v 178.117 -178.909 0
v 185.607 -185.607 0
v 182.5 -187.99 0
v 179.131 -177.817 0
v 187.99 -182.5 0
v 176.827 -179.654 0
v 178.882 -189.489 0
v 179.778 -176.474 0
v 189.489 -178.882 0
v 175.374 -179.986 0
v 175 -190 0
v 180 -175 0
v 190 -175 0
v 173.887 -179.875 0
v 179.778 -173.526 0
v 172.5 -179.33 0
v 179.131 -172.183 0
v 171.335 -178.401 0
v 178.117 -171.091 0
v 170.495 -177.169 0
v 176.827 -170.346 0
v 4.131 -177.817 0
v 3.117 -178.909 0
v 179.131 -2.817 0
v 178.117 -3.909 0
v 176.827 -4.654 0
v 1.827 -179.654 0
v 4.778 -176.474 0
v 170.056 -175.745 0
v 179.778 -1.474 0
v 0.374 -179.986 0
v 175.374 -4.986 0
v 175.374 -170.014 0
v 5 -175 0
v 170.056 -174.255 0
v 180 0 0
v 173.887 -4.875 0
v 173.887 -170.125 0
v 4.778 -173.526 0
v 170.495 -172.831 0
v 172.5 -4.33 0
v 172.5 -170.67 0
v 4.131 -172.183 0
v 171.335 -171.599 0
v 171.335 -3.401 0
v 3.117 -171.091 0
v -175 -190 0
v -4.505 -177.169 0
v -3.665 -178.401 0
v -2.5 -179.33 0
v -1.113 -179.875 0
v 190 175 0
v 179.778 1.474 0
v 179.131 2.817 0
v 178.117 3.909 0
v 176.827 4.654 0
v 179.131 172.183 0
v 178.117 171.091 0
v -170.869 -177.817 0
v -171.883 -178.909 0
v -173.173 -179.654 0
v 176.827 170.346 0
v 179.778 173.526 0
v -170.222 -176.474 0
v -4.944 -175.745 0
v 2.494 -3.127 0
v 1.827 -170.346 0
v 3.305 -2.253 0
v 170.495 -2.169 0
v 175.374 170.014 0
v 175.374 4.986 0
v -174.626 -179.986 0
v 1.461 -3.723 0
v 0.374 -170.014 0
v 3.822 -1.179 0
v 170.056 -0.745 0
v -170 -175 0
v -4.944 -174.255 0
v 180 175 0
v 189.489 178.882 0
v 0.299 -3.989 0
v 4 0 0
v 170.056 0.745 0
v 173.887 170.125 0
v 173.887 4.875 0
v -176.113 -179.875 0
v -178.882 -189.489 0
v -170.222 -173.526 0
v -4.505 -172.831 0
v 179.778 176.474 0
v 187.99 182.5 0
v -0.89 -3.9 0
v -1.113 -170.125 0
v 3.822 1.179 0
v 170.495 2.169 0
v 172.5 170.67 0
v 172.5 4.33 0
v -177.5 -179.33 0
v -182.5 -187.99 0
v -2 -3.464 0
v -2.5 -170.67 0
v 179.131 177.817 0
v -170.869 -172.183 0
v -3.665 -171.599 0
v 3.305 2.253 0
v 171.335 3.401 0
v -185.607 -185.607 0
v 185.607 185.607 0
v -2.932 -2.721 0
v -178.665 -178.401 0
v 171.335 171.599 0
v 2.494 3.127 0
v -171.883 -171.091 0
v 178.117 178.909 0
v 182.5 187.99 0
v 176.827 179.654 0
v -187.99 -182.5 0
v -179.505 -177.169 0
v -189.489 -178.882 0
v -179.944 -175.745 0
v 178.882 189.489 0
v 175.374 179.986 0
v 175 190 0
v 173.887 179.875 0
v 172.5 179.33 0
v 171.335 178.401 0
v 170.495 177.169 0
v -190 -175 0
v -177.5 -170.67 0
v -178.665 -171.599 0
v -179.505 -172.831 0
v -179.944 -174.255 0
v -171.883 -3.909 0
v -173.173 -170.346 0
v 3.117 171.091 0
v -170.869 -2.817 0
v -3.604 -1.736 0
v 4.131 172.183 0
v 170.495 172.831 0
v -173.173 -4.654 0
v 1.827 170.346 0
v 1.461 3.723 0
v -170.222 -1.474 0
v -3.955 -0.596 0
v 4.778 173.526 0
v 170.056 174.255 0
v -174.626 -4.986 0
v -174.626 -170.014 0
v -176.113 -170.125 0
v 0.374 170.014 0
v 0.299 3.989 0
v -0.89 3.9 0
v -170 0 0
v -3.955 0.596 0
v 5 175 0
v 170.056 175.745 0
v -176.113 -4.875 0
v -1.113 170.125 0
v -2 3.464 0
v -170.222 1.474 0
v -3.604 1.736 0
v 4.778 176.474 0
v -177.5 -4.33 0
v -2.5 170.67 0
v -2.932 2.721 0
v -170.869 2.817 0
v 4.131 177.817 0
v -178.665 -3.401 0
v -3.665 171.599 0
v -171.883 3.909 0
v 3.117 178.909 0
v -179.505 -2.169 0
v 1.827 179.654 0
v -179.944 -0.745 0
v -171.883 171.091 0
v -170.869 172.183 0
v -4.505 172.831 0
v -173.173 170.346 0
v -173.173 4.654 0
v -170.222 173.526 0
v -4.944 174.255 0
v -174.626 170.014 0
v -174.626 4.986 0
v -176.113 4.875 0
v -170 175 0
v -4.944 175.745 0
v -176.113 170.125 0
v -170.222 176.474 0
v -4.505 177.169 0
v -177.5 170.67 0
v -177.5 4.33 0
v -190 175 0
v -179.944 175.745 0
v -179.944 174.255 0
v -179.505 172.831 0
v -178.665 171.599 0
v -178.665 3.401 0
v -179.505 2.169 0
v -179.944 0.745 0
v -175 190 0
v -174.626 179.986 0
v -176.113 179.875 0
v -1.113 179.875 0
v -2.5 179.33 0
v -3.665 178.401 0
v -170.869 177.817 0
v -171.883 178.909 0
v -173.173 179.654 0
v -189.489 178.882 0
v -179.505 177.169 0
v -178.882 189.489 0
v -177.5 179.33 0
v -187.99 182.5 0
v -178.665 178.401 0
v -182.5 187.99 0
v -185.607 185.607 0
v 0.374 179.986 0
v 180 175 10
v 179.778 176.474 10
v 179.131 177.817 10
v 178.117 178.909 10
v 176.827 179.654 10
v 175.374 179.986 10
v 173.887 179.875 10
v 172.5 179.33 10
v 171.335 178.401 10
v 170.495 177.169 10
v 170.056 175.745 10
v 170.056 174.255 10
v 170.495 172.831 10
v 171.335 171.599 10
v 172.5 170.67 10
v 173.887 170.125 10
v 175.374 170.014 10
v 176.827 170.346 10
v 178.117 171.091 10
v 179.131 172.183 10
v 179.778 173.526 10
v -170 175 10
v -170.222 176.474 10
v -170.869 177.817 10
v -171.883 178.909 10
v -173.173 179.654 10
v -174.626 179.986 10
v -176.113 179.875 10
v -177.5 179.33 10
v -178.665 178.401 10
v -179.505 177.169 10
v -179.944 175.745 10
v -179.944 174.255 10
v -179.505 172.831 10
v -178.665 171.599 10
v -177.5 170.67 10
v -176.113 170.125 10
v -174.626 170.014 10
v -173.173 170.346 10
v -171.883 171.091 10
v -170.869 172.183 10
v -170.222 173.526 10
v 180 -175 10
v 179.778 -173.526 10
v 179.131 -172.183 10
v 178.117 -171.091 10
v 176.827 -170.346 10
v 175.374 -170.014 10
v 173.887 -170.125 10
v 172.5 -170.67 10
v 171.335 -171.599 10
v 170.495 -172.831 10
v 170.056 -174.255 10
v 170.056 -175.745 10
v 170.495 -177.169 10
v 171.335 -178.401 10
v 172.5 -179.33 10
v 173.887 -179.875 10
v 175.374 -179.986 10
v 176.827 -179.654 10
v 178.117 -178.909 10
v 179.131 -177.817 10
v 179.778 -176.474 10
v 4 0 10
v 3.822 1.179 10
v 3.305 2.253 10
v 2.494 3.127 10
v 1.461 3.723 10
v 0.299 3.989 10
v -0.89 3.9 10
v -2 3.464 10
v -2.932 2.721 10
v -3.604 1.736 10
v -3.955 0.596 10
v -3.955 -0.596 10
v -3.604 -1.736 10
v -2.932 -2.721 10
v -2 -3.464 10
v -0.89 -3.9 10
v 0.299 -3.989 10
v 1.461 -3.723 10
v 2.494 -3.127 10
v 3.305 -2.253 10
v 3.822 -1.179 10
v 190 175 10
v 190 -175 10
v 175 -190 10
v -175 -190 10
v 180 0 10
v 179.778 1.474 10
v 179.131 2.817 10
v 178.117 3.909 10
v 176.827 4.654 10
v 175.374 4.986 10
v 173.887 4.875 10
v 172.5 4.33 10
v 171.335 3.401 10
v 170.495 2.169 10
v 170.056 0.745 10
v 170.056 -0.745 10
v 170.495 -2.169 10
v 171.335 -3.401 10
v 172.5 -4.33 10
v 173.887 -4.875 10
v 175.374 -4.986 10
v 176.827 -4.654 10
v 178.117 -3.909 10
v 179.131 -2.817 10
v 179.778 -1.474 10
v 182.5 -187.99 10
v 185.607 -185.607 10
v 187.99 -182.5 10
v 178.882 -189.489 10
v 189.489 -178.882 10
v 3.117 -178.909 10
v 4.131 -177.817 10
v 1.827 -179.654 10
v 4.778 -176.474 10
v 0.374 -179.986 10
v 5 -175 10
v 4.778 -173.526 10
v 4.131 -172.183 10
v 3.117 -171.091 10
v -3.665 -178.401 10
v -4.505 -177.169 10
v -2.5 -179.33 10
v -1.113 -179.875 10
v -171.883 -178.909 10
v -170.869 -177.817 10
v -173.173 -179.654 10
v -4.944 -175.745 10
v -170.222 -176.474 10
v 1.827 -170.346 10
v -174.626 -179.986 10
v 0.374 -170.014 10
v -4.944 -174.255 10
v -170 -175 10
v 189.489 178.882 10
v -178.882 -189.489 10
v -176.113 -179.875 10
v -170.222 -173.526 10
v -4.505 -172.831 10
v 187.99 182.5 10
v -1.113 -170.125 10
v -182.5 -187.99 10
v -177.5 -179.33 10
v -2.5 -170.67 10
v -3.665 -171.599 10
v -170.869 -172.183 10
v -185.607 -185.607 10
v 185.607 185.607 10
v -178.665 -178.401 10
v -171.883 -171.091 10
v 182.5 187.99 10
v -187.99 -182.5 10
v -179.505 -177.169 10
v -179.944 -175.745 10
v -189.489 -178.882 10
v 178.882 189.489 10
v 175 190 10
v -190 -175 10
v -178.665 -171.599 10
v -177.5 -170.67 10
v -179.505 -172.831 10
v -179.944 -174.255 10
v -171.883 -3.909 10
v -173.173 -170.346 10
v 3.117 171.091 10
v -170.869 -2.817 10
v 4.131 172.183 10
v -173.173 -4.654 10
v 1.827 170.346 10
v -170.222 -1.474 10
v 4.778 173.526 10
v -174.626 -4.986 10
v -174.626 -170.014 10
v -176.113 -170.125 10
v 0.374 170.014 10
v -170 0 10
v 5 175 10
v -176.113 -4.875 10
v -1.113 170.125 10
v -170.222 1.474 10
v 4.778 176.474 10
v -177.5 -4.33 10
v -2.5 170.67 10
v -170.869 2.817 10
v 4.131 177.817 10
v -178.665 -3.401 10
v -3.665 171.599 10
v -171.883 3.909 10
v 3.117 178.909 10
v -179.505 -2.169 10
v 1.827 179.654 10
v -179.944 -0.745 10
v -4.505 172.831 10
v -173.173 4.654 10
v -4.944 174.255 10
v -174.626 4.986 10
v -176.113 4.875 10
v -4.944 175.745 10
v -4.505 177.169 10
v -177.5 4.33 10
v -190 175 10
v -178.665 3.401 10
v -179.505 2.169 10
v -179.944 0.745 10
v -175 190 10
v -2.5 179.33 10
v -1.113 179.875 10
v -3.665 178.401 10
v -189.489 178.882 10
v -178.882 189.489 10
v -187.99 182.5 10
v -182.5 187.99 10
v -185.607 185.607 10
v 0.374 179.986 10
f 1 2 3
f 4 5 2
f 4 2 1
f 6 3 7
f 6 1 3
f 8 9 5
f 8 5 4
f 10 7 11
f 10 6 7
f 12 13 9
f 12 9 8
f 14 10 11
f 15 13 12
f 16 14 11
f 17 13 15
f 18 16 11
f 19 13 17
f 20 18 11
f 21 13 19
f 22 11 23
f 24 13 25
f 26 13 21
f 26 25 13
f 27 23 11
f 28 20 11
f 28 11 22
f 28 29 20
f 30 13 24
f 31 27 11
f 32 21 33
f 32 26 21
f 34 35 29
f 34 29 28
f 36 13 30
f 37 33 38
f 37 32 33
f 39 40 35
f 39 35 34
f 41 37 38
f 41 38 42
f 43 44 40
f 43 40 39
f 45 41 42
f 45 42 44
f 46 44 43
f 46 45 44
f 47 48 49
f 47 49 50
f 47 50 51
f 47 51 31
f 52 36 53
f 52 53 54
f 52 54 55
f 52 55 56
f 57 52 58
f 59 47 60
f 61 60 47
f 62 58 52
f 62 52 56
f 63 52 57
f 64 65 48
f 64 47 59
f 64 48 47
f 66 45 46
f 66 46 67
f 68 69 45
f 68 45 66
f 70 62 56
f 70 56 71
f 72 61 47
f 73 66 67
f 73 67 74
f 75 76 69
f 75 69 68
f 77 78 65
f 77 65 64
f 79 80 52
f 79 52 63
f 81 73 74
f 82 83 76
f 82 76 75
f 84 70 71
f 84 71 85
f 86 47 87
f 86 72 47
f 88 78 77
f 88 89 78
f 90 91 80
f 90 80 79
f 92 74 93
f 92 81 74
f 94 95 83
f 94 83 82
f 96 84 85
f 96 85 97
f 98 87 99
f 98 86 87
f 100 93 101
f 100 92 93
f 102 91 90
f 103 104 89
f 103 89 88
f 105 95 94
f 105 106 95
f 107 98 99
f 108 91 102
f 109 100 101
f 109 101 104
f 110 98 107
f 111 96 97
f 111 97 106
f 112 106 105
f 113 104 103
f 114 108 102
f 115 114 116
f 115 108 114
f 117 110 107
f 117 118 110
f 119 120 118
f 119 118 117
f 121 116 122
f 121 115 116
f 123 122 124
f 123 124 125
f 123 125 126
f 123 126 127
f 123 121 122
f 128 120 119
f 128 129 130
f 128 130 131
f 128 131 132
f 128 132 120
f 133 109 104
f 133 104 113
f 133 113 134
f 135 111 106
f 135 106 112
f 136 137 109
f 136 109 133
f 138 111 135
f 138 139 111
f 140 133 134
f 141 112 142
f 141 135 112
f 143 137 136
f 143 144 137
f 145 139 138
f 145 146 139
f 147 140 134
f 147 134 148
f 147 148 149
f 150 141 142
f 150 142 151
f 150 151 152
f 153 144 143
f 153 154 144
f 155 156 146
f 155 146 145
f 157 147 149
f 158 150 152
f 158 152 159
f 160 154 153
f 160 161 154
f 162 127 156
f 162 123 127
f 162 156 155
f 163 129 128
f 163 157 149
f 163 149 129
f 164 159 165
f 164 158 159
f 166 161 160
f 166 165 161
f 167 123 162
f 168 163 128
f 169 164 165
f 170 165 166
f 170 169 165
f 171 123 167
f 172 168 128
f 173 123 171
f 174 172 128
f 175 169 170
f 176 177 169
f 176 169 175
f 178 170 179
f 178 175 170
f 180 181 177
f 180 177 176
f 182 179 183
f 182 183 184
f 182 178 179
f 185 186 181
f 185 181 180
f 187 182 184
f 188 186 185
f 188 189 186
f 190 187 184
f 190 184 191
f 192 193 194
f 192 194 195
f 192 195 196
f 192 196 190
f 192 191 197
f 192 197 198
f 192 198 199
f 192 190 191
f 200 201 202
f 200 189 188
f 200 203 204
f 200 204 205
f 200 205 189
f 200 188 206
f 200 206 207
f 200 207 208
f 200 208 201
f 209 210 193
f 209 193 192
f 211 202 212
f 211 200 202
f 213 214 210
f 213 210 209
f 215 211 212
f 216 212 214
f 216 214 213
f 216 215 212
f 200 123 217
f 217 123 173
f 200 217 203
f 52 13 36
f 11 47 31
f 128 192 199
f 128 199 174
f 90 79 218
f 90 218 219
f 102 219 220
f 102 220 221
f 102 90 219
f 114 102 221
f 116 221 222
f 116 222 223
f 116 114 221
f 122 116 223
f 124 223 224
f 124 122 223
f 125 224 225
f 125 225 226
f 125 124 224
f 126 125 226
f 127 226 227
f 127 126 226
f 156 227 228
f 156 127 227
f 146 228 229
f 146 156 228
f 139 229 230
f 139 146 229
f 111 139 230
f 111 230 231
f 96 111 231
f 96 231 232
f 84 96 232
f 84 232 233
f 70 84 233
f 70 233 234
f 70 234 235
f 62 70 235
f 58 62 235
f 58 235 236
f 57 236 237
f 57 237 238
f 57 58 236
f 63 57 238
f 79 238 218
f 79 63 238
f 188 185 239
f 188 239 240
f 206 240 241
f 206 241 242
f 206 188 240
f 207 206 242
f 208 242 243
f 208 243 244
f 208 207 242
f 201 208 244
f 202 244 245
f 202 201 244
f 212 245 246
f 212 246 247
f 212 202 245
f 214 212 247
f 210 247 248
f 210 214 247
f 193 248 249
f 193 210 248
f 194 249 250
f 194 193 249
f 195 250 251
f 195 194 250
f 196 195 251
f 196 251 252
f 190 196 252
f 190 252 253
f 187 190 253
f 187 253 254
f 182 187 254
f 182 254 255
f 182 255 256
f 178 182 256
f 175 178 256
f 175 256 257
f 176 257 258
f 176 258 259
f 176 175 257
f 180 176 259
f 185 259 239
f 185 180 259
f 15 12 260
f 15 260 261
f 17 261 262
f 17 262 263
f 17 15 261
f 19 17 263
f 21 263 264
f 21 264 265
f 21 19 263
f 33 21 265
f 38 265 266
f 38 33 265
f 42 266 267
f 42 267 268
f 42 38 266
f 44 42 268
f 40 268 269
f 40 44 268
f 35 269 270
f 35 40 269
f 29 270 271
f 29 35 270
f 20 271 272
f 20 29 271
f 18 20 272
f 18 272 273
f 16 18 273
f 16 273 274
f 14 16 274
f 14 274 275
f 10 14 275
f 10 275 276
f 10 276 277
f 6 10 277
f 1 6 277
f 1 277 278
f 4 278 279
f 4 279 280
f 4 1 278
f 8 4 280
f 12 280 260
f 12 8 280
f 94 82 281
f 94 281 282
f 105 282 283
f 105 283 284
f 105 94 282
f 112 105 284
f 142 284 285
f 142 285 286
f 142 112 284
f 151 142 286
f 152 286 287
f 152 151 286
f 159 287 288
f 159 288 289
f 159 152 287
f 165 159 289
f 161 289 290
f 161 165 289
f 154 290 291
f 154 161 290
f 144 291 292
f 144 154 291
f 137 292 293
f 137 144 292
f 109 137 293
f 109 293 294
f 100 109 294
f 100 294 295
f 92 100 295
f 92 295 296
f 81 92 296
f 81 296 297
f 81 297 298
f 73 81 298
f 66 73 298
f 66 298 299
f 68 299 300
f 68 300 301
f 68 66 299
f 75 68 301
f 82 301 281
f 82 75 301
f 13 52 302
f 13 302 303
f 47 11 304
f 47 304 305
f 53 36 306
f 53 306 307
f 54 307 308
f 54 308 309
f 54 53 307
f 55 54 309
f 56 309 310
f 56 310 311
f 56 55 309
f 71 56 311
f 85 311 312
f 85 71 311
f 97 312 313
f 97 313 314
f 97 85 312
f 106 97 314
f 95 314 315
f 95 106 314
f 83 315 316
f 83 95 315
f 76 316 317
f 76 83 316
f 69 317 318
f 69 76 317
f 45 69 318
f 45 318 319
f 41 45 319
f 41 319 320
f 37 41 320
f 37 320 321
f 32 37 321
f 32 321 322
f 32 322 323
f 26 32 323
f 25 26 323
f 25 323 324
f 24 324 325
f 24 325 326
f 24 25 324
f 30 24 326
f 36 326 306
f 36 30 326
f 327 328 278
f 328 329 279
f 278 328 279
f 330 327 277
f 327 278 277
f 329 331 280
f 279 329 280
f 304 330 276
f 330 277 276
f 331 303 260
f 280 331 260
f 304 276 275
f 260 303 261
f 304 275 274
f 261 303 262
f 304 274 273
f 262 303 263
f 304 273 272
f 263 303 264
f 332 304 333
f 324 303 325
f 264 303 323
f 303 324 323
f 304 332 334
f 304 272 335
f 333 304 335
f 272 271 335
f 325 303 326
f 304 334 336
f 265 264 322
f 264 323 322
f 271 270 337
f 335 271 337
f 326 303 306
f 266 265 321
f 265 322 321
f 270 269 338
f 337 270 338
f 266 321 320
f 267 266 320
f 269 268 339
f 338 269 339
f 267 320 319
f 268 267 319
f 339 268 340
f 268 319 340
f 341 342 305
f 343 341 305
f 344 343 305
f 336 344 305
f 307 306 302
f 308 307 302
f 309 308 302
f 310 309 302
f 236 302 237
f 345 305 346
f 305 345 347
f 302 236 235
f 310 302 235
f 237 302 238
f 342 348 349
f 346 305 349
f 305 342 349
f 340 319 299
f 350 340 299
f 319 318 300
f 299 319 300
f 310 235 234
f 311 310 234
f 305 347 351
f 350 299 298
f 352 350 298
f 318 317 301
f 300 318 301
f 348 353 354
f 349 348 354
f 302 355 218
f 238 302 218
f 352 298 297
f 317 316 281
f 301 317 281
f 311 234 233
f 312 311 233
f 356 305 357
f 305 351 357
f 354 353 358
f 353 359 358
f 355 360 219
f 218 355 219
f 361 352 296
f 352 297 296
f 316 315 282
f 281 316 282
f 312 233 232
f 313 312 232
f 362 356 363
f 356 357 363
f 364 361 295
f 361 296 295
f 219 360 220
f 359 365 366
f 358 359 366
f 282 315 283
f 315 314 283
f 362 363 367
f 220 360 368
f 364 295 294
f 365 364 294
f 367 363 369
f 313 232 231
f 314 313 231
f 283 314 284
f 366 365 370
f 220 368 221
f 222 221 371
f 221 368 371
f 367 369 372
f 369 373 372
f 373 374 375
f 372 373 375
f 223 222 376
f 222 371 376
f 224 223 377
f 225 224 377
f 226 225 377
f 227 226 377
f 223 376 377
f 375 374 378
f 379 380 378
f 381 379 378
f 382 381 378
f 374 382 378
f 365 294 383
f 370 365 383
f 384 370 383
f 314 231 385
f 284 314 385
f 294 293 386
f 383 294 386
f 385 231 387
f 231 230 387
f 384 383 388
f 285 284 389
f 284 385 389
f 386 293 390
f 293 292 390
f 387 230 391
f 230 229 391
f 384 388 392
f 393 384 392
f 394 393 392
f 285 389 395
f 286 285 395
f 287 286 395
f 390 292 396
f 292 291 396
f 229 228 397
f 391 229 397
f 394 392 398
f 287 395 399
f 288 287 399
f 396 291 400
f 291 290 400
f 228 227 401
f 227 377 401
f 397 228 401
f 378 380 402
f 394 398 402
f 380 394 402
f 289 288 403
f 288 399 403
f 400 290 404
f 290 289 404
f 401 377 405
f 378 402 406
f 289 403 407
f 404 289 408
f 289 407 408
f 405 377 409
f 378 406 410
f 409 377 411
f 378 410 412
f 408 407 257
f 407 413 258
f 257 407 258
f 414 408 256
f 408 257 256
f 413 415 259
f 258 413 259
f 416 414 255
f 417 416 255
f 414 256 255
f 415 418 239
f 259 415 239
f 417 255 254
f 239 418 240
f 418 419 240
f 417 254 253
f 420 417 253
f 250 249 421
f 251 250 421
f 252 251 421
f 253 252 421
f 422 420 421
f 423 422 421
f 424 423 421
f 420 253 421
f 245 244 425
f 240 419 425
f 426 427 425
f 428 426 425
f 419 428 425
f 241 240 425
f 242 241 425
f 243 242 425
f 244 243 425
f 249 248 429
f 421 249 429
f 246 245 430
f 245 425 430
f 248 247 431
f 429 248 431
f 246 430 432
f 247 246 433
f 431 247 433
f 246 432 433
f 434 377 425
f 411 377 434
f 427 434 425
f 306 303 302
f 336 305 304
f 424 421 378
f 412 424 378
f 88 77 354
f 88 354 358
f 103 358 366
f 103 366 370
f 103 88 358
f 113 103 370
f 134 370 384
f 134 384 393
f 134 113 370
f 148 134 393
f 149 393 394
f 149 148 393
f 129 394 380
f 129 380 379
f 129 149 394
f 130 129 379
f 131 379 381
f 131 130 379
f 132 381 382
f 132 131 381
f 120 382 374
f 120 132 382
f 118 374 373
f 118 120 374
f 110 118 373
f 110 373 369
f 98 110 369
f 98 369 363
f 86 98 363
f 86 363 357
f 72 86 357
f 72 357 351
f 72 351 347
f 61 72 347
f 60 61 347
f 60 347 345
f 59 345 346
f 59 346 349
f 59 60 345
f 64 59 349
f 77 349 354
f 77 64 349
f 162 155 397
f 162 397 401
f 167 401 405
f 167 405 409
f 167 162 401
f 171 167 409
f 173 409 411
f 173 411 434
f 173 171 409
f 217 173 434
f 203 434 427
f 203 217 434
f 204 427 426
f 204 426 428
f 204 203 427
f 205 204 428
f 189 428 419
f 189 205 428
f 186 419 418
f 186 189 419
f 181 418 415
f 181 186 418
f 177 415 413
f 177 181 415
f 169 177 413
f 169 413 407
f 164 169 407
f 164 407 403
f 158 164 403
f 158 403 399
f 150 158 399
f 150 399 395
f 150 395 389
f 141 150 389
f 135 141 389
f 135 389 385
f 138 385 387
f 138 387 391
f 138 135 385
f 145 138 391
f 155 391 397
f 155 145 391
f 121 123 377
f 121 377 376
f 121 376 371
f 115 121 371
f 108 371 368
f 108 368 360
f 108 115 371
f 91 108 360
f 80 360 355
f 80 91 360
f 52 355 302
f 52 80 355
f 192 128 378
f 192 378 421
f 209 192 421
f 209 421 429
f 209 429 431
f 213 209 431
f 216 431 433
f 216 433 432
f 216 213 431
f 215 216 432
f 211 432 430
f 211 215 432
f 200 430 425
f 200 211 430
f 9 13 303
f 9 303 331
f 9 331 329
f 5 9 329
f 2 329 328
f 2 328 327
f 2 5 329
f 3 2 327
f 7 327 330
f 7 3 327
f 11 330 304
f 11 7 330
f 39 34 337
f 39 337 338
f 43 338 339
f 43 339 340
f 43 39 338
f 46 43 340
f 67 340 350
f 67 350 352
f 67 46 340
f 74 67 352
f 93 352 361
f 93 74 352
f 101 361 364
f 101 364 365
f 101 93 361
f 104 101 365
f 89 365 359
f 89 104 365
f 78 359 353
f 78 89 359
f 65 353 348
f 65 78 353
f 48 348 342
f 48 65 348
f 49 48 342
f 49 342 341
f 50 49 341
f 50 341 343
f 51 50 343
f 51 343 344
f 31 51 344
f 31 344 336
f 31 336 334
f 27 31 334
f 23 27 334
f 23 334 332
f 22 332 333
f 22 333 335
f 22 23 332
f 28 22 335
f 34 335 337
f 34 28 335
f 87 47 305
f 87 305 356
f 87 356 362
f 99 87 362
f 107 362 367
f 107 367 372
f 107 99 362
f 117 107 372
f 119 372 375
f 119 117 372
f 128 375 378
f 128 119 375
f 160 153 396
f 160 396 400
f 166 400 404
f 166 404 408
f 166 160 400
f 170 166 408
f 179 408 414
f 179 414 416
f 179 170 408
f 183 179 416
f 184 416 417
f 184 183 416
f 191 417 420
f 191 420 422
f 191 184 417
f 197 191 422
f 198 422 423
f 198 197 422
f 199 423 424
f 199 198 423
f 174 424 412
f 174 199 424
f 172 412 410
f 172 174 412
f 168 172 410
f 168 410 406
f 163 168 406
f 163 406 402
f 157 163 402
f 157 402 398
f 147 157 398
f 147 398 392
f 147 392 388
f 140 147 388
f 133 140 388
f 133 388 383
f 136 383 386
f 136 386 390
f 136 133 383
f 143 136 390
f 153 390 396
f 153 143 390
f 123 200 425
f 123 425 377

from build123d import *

# Parameters (mm, degrees)
SKETCH2_R           = 5
SKETCH2_R_2         = 4
BOSS_EXTRUDE1_DEPTH = 10


with BuildPart() as part:
    # Sketch2 → Boss-Extrude1 (new body)
    with BuildSketch(Plane.XY):
        with BuildLine():
            Line((-175, 190), (175, 190))
            ThreePointArc((175, 190), (185.606601718, 185.606601718), (190, 175))
            Line((190, 175), (190, -175))
            ThreePointArc((190, -175), (185.606601718, -185.606601718), (175, -190))
            Line((175, -190), (-175, -190))
            ThreePointArc((-175, -190), (-185.606601718, -185.606601718), (-190, -175))
            Line((-190, -175), (-190, 175))
            ThreePointArc((-190, 175), (-185.606601718, 185.606601718), (-175, 190))
        make_face()
        with Locations((-175, 175)):
            Circle(SKETCH2_R, mode=Mode.SUBTRACT)
        with Locations((0, 175)):
            Circle(SKETCH2_R, mode=Mode.SUBTRACT)
        with Locations((175, 175)):
            Circle(SKETCH2_R, mode=Mode.SUBTRACT)
        with Locations((175, 0)):
            Circle(SKETCH2_R, mode=Mode.SUBTRACT)
        with Locations((-175, 0)):
            Circle(SKETCH2_R, mode=Mode.SUBTRACT)
        with Locations((-175, -175)):
            Circle(SKETCH2_R, mode=Mode.SUBTRACT)
        with Locations((0, -175)):
            Circle(SKETCH2_R, mode=Mode.SUBTRACT)
        with Locations((175, -175)):
            Circle(SKETCH2_R, mode=Mode.SUBTRACT)
        Circle(SKETCH2_R_2, mode=Mode.SUBTRACT)
    extrude(amount=BOSS_EXTRUDE1_DEPTH)


solid = part.part
